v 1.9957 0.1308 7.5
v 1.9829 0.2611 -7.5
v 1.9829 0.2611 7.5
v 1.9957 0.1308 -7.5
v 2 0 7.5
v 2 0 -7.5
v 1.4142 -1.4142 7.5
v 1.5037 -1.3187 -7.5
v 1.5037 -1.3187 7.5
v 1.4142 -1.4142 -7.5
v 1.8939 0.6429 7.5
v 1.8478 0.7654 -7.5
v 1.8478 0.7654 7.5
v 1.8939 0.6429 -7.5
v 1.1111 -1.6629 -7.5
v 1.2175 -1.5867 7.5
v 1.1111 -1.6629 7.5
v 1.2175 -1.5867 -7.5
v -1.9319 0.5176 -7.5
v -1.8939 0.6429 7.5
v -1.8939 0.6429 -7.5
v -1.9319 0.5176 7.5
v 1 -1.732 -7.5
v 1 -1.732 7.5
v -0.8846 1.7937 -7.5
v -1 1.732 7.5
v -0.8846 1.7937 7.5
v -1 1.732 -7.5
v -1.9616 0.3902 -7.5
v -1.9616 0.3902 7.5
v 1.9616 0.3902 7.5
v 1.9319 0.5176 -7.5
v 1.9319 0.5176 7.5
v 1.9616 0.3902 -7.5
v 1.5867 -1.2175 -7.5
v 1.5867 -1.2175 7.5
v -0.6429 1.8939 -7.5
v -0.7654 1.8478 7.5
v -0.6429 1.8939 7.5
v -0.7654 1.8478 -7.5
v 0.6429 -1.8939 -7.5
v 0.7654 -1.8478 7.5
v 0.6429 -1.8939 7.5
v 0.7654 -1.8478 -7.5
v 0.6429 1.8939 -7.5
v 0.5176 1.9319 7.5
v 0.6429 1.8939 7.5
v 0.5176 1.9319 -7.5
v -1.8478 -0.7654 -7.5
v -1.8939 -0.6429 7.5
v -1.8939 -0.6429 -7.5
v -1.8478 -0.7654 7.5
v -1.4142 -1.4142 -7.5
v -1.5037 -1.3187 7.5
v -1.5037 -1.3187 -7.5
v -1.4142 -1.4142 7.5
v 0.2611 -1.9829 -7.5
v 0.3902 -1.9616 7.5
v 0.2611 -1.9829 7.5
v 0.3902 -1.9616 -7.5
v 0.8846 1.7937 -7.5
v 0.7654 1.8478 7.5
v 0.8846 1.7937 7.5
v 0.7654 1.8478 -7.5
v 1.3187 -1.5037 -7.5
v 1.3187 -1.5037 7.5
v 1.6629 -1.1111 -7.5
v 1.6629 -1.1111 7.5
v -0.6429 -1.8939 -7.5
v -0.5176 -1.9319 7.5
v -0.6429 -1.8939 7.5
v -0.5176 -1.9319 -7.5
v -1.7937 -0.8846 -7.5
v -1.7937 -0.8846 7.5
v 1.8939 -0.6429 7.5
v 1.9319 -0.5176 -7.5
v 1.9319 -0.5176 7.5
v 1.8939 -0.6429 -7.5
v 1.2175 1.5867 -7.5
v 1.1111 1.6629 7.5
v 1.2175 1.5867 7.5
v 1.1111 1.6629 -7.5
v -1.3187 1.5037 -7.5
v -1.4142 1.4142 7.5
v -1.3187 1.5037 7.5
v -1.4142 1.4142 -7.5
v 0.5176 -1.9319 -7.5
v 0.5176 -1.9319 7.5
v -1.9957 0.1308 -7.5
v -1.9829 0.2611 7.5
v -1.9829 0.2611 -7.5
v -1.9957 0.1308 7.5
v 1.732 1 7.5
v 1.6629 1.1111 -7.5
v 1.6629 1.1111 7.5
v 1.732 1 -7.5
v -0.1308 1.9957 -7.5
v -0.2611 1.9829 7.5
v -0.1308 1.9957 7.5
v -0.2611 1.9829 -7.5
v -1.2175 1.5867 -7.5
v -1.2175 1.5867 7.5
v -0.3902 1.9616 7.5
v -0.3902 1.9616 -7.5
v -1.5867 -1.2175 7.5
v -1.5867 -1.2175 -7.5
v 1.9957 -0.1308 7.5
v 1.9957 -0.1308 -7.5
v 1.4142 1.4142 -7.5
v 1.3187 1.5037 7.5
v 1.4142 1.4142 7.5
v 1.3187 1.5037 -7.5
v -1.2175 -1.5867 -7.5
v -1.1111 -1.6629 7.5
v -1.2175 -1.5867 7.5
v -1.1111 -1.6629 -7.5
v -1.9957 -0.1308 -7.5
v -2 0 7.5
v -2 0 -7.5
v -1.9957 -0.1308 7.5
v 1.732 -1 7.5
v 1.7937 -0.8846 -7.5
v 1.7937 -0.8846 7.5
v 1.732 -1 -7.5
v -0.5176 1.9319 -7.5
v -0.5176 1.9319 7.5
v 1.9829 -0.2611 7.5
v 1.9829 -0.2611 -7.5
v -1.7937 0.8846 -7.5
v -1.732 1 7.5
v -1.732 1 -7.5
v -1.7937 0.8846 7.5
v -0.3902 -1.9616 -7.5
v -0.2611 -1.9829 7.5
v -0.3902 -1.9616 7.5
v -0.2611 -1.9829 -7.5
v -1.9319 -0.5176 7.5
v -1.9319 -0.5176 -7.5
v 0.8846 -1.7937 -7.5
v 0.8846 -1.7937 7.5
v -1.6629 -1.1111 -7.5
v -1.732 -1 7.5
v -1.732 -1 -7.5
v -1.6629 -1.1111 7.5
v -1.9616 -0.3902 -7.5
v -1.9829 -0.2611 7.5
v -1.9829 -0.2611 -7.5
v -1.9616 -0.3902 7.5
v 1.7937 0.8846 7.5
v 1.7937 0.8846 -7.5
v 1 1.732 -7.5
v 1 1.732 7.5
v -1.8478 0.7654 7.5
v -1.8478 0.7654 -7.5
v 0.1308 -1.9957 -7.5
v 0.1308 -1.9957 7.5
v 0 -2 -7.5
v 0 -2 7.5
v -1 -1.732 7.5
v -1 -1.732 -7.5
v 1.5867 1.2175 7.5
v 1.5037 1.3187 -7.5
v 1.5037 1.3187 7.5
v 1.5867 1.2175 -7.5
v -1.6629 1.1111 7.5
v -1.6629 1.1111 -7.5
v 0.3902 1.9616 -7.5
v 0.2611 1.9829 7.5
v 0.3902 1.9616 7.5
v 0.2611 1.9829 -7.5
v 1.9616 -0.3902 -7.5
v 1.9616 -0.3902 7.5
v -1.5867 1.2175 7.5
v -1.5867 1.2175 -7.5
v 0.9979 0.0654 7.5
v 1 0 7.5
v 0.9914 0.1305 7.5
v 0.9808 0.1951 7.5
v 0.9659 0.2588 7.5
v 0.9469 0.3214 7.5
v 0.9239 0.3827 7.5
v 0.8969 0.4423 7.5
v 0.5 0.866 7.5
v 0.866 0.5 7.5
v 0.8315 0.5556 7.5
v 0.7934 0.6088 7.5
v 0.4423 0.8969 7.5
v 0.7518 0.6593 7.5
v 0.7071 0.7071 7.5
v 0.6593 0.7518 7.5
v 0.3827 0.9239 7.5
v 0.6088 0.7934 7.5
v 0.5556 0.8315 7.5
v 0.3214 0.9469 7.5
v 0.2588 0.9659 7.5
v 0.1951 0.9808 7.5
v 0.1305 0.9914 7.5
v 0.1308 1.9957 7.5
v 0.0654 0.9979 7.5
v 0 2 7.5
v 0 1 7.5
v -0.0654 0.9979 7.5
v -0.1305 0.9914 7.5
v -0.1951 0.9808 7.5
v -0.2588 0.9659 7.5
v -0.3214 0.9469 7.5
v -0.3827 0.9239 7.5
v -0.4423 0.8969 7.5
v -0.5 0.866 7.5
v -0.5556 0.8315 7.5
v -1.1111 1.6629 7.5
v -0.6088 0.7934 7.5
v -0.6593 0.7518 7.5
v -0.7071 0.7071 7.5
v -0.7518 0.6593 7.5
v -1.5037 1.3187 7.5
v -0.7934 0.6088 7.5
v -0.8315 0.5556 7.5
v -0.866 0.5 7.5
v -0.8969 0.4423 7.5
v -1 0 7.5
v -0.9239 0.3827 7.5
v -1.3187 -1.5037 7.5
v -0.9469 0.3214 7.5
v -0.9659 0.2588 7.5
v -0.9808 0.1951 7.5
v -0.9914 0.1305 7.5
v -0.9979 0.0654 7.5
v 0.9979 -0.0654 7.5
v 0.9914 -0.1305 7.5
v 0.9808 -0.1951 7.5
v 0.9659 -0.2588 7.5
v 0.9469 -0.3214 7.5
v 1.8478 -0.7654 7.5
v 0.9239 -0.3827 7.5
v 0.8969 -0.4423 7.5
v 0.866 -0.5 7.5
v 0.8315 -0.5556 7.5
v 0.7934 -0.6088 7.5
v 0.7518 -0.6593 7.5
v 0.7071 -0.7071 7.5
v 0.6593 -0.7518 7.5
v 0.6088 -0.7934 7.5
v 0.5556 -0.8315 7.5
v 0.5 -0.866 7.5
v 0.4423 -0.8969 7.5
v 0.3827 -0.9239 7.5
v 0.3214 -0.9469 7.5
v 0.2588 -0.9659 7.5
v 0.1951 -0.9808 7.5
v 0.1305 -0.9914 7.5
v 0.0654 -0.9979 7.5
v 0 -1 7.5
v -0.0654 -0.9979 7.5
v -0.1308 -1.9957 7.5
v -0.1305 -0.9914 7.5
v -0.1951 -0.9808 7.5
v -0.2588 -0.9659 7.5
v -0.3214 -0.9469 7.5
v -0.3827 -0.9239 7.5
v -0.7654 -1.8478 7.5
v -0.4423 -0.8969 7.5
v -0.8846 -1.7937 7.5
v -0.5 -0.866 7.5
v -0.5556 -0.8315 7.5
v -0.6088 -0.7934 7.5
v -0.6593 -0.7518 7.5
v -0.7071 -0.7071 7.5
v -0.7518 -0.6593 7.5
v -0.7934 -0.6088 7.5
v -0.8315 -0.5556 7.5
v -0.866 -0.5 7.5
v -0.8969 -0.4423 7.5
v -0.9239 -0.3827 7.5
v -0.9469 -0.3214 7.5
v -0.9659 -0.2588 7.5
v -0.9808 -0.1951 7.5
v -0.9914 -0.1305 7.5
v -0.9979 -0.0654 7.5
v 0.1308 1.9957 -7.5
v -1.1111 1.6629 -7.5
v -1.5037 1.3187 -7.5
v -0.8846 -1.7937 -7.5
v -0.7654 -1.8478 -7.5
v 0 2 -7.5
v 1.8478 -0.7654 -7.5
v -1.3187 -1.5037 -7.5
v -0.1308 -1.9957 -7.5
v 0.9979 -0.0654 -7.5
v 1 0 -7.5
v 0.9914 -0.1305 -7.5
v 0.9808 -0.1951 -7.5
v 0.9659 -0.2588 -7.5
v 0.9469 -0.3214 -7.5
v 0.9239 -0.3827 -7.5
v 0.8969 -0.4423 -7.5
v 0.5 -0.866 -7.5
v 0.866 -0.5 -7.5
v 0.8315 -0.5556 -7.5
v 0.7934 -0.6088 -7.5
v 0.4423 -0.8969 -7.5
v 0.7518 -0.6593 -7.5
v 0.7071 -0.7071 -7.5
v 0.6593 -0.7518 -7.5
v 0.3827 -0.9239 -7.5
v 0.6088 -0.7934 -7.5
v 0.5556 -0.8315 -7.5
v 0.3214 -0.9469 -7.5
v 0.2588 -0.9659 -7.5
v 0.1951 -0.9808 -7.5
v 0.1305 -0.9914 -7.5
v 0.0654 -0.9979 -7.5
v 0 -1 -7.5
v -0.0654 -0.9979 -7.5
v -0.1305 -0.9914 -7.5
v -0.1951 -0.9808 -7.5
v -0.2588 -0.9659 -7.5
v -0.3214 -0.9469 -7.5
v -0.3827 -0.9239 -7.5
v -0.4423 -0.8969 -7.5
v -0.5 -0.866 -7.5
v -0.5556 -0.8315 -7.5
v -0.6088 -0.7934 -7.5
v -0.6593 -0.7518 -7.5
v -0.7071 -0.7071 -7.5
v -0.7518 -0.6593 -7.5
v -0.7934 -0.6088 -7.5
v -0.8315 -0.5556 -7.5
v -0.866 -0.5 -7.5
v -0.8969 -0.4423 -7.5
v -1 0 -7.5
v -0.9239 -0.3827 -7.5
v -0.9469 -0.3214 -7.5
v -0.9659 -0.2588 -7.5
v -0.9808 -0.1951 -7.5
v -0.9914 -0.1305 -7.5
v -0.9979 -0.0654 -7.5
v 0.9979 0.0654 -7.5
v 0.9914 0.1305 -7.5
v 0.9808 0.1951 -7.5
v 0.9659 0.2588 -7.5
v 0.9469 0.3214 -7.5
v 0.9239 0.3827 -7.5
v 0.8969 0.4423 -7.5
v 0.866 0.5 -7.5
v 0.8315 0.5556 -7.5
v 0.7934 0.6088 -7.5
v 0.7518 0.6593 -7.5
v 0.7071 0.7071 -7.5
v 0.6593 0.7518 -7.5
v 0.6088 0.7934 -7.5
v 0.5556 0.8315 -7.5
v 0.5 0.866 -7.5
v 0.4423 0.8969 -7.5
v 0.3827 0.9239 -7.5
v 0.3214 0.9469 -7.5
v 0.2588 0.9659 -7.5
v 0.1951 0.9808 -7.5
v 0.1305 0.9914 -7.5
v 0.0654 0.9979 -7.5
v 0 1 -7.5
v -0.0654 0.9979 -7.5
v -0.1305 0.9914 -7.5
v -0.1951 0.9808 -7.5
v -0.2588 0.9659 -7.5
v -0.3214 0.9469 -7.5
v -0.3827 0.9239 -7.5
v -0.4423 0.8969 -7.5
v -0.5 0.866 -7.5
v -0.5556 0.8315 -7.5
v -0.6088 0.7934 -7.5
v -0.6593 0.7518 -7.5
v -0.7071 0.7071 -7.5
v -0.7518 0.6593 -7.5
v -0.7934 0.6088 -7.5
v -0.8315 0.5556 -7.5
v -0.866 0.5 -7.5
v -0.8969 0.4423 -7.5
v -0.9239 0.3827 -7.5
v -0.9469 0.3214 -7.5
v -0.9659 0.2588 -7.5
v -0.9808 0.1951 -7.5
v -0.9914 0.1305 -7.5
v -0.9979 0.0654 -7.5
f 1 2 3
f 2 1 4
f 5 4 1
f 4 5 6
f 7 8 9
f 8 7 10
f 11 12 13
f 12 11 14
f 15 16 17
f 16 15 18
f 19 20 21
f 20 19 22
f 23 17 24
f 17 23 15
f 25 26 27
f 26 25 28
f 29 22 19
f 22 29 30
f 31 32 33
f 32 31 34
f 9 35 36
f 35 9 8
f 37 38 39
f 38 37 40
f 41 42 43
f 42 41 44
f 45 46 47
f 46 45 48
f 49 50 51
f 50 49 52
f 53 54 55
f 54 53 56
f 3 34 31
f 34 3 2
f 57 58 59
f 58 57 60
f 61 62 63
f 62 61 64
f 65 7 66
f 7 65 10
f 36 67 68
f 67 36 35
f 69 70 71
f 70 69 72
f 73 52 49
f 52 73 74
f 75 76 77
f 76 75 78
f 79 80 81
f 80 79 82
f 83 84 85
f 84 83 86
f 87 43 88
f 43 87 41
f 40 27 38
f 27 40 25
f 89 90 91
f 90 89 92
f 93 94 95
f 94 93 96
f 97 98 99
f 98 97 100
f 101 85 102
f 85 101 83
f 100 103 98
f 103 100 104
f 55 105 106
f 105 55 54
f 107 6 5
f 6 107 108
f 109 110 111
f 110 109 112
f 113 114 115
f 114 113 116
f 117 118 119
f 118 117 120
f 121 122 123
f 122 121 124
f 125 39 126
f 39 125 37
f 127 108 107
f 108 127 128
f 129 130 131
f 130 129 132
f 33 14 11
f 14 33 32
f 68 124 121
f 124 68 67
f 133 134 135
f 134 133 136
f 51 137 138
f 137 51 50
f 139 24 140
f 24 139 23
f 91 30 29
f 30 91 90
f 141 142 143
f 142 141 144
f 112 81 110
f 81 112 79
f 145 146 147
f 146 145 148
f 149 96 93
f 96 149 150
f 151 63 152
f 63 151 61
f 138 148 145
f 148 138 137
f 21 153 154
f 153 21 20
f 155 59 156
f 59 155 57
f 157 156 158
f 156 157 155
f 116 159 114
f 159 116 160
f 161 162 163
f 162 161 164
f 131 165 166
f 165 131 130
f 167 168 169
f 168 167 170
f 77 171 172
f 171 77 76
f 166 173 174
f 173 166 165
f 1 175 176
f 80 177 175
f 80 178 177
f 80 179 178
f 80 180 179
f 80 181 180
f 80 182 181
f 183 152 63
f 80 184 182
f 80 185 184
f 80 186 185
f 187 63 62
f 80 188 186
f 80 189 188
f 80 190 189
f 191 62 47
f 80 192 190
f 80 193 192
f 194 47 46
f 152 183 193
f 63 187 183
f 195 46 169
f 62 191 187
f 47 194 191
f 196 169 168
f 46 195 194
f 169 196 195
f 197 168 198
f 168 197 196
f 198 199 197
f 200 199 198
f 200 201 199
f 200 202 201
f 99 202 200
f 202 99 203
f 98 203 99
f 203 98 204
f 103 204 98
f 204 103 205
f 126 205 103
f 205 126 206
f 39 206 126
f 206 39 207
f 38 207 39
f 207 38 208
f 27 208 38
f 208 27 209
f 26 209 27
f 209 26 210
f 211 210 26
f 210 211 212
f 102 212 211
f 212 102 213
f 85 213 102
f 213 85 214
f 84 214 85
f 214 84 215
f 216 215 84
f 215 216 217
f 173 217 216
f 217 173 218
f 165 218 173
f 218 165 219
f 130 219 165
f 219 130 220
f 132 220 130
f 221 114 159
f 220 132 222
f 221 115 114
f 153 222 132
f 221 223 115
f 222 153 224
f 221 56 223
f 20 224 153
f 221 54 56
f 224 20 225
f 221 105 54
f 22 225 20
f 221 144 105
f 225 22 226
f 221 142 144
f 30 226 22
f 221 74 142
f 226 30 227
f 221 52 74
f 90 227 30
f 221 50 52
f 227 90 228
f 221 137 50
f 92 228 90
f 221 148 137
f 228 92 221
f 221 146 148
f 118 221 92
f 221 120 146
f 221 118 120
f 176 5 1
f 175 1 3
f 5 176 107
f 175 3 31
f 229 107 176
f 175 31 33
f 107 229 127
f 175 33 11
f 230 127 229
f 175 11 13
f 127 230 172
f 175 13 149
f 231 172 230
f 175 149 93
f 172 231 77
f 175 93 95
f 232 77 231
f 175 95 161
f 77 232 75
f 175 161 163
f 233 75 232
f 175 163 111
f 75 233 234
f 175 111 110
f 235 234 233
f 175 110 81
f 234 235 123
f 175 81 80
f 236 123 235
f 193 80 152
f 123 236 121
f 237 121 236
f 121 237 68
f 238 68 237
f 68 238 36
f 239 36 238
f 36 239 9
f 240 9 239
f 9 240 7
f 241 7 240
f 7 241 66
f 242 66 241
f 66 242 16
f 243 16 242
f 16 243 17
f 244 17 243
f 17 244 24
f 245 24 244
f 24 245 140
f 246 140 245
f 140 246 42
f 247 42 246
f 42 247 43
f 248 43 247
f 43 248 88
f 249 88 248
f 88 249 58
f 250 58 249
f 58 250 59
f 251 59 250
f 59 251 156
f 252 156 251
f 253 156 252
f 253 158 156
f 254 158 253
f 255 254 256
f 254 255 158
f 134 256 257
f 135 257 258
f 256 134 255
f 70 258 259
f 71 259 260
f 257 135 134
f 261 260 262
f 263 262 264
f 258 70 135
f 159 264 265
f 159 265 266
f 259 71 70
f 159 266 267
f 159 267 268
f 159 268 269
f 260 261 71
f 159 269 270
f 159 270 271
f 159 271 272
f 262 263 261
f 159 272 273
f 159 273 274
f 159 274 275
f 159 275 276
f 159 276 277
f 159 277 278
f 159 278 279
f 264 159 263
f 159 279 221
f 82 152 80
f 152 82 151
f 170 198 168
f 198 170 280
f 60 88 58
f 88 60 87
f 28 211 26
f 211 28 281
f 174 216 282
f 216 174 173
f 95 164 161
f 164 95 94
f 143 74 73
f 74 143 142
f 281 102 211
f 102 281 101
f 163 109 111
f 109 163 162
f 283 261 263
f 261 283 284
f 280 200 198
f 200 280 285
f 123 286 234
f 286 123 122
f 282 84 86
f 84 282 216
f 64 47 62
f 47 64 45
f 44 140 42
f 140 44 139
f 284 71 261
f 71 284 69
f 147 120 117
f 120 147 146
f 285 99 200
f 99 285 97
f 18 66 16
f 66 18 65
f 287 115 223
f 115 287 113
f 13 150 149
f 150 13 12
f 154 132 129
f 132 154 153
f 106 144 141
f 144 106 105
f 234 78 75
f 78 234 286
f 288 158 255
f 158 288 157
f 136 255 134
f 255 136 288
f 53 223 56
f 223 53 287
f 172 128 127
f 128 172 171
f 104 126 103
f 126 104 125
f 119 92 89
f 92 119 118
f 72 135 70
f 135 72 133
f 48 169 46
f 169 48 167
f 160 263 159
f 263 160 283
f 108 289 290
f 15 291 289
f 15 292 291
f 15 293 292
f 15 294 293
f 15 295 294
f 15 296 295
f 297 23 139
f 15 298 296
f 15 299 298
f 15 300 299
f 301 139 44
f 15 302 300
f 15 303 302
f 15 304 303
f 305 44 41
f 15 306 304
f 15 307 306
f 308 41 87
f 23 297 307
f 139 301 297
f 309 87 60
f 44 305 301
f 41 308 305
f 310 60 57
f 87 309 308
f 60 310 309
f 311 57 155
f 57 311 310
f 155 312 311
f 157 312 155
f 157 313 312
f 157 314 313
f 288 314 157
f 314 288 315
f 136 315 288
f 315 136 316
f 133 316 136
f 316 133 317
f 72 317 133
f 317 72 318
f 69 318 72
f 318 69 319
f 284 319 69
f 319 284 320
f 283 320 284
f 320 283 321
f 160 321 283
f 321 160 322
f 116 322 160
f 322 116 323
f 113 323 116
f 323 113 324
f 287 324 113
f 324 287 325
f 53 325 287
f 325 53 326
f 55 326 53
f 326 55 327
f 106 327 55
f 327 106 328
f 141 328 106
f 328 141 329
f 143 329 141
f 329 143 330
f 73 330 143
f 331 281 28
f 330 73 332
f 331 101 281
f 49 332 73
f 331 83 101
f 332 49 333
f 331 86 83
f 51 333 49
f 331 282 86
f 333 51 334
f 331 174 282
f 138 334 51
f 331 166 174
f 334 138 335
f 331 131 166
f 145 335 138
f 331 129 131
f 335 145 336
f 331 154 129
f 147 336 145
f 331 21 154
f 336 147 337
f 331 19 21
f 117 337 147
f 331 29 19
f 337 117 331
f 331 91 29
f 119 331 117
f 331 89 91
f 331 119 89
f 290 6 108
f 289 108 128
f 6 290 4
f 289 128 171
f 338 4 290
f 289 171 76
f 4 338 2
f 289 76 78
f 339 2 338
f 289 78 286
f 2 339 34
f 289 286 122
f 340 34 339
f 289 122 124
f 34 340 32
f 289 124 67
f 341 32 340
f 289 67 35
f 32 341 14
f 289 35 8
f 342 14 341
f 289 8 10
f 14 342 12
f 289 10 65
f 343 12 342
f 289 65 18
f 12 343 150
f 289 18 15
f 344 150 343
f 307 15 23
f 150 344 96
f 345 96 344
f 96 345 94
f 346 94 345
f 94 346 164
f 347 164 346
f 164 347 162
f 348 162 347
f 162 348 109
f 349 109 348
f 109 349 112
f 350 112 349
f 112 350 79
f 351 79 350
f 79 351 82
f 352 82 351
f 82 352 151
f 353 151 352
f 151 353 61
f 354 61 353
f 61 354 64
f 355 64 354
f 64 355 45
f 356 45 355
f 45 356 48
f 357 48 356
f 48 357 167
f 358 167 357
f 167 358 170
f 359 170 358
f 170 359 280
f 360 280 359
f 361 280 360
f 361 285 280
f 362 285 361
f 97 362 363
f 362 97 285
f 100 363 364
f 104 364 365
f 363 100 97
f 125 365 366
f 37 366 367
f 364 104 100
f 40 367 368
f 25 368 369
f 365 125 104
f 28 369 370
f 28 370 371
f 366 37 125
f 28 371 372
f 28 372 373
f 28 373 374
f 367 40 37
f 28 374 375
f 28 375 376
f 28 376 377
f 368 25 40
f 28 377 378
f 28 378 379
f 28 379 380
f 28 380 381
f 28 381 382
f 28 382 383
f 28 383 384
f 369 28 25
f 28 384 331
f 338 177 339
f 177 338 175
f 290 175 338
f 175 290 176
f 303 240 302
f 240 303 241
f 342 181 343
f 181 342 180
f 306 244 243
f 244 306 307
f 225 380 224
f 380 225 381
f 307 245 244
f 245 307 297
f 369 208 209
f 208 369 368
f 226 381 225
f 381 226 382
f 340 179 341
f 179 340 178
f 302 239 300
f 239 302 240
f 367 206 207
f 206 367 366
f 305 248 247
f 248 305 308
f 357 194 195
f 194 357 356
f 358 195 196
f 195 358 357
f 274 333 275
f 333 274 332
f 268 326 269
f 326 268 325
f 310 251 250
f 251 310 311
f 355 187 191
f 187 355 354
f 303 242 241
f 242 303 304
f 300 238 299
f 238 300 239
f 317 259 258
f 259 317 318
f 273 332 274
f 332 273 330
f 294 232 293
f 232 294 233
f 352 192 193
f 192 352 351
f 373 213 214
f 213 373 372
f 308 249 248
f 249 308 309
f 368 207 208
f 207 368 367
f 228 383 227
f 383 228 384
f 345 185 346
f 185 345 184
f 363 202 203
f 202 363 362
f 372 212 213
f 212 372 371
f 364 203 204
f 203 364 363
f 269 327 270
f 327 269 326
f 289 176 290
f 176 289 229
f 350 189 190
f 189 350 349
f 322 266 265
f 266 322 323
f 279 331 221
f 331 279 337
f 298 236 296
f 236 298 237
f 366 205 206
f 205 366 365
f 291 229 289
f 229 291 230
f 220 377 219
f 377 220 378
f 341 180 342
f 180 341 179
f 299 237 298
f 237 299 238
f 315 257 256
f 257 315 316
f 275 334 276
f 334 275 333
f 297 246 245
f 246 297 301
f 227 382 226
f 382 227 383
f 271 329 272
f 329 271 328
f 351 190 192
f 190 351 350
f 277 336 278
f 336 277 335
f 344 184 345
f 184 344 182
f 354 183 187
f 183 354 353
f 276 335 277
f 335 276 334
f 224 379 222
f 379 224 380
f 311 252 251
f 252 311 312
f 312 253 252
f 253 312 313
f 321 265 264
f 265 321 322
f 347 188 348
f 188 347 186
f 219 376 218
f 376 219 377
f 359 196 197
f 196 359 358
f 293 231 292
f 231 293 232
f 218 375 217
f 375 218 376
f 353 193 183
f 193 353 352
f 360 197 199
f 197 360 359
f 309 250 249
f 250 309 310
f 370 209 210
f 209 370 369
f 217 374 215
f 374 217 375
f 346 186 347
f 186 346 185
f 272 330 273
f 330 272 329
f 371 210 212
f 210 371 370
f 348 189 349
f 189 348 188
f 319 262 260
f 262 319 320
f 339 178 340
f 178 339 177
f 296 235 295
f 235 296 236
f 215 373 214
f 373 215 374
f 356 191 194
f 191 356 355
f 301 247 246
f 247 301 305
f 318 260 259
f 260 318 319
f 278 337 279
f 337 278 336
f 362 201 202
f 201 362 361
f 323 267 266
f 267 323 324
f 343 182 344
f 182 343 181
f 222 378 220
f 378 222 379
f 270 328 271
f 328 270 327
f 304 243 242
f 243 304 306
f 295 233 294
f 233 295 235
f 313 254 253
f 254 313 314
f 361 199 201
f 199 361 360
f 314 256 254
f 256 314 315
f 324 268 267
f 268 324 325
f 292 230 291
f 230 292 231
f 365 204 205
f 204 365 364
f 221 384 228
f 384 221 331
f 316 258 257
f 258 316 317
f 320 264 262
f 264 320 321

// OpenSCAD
// Parameters
length_mm = 15; //[8:30:1]
outer_diameter_mm = 4; //[2:8:0.1]
inner_diameter_mm = 2; //[1:6:0.1]
center = 1; //[0:1:1]
eps_overlap_mm = 0.8; //[0.5:2:0.1]

// Smoothness (prevents polygonal look)
$fn = 96;

// PTFE Tubing - cylindrical hollow tube
module tubing() {
  // Basic sanity to avoid invalid/blank geometry
  od = max(outer_diameter_mm, 0.01);
  id = min(max(inner_diameter_mm, 0), od - 0.02); // ensure wall thickness > 0
  len = max(length_mm, 0.01);

  z0 = center ? 0 : len/2;

  color([0.85, 0.85, 0.8])  // Off-white for PTFE
  translate([0, 0, z0])
  difference() {
    cylinder(h=len, r=od/2, center=true);
    cylinder(h=len + 2*eps_overlap_mm, r=id/2, center=true);
  }
}

// Assembly
module assembly() {
  tubing();
}

assembly();
